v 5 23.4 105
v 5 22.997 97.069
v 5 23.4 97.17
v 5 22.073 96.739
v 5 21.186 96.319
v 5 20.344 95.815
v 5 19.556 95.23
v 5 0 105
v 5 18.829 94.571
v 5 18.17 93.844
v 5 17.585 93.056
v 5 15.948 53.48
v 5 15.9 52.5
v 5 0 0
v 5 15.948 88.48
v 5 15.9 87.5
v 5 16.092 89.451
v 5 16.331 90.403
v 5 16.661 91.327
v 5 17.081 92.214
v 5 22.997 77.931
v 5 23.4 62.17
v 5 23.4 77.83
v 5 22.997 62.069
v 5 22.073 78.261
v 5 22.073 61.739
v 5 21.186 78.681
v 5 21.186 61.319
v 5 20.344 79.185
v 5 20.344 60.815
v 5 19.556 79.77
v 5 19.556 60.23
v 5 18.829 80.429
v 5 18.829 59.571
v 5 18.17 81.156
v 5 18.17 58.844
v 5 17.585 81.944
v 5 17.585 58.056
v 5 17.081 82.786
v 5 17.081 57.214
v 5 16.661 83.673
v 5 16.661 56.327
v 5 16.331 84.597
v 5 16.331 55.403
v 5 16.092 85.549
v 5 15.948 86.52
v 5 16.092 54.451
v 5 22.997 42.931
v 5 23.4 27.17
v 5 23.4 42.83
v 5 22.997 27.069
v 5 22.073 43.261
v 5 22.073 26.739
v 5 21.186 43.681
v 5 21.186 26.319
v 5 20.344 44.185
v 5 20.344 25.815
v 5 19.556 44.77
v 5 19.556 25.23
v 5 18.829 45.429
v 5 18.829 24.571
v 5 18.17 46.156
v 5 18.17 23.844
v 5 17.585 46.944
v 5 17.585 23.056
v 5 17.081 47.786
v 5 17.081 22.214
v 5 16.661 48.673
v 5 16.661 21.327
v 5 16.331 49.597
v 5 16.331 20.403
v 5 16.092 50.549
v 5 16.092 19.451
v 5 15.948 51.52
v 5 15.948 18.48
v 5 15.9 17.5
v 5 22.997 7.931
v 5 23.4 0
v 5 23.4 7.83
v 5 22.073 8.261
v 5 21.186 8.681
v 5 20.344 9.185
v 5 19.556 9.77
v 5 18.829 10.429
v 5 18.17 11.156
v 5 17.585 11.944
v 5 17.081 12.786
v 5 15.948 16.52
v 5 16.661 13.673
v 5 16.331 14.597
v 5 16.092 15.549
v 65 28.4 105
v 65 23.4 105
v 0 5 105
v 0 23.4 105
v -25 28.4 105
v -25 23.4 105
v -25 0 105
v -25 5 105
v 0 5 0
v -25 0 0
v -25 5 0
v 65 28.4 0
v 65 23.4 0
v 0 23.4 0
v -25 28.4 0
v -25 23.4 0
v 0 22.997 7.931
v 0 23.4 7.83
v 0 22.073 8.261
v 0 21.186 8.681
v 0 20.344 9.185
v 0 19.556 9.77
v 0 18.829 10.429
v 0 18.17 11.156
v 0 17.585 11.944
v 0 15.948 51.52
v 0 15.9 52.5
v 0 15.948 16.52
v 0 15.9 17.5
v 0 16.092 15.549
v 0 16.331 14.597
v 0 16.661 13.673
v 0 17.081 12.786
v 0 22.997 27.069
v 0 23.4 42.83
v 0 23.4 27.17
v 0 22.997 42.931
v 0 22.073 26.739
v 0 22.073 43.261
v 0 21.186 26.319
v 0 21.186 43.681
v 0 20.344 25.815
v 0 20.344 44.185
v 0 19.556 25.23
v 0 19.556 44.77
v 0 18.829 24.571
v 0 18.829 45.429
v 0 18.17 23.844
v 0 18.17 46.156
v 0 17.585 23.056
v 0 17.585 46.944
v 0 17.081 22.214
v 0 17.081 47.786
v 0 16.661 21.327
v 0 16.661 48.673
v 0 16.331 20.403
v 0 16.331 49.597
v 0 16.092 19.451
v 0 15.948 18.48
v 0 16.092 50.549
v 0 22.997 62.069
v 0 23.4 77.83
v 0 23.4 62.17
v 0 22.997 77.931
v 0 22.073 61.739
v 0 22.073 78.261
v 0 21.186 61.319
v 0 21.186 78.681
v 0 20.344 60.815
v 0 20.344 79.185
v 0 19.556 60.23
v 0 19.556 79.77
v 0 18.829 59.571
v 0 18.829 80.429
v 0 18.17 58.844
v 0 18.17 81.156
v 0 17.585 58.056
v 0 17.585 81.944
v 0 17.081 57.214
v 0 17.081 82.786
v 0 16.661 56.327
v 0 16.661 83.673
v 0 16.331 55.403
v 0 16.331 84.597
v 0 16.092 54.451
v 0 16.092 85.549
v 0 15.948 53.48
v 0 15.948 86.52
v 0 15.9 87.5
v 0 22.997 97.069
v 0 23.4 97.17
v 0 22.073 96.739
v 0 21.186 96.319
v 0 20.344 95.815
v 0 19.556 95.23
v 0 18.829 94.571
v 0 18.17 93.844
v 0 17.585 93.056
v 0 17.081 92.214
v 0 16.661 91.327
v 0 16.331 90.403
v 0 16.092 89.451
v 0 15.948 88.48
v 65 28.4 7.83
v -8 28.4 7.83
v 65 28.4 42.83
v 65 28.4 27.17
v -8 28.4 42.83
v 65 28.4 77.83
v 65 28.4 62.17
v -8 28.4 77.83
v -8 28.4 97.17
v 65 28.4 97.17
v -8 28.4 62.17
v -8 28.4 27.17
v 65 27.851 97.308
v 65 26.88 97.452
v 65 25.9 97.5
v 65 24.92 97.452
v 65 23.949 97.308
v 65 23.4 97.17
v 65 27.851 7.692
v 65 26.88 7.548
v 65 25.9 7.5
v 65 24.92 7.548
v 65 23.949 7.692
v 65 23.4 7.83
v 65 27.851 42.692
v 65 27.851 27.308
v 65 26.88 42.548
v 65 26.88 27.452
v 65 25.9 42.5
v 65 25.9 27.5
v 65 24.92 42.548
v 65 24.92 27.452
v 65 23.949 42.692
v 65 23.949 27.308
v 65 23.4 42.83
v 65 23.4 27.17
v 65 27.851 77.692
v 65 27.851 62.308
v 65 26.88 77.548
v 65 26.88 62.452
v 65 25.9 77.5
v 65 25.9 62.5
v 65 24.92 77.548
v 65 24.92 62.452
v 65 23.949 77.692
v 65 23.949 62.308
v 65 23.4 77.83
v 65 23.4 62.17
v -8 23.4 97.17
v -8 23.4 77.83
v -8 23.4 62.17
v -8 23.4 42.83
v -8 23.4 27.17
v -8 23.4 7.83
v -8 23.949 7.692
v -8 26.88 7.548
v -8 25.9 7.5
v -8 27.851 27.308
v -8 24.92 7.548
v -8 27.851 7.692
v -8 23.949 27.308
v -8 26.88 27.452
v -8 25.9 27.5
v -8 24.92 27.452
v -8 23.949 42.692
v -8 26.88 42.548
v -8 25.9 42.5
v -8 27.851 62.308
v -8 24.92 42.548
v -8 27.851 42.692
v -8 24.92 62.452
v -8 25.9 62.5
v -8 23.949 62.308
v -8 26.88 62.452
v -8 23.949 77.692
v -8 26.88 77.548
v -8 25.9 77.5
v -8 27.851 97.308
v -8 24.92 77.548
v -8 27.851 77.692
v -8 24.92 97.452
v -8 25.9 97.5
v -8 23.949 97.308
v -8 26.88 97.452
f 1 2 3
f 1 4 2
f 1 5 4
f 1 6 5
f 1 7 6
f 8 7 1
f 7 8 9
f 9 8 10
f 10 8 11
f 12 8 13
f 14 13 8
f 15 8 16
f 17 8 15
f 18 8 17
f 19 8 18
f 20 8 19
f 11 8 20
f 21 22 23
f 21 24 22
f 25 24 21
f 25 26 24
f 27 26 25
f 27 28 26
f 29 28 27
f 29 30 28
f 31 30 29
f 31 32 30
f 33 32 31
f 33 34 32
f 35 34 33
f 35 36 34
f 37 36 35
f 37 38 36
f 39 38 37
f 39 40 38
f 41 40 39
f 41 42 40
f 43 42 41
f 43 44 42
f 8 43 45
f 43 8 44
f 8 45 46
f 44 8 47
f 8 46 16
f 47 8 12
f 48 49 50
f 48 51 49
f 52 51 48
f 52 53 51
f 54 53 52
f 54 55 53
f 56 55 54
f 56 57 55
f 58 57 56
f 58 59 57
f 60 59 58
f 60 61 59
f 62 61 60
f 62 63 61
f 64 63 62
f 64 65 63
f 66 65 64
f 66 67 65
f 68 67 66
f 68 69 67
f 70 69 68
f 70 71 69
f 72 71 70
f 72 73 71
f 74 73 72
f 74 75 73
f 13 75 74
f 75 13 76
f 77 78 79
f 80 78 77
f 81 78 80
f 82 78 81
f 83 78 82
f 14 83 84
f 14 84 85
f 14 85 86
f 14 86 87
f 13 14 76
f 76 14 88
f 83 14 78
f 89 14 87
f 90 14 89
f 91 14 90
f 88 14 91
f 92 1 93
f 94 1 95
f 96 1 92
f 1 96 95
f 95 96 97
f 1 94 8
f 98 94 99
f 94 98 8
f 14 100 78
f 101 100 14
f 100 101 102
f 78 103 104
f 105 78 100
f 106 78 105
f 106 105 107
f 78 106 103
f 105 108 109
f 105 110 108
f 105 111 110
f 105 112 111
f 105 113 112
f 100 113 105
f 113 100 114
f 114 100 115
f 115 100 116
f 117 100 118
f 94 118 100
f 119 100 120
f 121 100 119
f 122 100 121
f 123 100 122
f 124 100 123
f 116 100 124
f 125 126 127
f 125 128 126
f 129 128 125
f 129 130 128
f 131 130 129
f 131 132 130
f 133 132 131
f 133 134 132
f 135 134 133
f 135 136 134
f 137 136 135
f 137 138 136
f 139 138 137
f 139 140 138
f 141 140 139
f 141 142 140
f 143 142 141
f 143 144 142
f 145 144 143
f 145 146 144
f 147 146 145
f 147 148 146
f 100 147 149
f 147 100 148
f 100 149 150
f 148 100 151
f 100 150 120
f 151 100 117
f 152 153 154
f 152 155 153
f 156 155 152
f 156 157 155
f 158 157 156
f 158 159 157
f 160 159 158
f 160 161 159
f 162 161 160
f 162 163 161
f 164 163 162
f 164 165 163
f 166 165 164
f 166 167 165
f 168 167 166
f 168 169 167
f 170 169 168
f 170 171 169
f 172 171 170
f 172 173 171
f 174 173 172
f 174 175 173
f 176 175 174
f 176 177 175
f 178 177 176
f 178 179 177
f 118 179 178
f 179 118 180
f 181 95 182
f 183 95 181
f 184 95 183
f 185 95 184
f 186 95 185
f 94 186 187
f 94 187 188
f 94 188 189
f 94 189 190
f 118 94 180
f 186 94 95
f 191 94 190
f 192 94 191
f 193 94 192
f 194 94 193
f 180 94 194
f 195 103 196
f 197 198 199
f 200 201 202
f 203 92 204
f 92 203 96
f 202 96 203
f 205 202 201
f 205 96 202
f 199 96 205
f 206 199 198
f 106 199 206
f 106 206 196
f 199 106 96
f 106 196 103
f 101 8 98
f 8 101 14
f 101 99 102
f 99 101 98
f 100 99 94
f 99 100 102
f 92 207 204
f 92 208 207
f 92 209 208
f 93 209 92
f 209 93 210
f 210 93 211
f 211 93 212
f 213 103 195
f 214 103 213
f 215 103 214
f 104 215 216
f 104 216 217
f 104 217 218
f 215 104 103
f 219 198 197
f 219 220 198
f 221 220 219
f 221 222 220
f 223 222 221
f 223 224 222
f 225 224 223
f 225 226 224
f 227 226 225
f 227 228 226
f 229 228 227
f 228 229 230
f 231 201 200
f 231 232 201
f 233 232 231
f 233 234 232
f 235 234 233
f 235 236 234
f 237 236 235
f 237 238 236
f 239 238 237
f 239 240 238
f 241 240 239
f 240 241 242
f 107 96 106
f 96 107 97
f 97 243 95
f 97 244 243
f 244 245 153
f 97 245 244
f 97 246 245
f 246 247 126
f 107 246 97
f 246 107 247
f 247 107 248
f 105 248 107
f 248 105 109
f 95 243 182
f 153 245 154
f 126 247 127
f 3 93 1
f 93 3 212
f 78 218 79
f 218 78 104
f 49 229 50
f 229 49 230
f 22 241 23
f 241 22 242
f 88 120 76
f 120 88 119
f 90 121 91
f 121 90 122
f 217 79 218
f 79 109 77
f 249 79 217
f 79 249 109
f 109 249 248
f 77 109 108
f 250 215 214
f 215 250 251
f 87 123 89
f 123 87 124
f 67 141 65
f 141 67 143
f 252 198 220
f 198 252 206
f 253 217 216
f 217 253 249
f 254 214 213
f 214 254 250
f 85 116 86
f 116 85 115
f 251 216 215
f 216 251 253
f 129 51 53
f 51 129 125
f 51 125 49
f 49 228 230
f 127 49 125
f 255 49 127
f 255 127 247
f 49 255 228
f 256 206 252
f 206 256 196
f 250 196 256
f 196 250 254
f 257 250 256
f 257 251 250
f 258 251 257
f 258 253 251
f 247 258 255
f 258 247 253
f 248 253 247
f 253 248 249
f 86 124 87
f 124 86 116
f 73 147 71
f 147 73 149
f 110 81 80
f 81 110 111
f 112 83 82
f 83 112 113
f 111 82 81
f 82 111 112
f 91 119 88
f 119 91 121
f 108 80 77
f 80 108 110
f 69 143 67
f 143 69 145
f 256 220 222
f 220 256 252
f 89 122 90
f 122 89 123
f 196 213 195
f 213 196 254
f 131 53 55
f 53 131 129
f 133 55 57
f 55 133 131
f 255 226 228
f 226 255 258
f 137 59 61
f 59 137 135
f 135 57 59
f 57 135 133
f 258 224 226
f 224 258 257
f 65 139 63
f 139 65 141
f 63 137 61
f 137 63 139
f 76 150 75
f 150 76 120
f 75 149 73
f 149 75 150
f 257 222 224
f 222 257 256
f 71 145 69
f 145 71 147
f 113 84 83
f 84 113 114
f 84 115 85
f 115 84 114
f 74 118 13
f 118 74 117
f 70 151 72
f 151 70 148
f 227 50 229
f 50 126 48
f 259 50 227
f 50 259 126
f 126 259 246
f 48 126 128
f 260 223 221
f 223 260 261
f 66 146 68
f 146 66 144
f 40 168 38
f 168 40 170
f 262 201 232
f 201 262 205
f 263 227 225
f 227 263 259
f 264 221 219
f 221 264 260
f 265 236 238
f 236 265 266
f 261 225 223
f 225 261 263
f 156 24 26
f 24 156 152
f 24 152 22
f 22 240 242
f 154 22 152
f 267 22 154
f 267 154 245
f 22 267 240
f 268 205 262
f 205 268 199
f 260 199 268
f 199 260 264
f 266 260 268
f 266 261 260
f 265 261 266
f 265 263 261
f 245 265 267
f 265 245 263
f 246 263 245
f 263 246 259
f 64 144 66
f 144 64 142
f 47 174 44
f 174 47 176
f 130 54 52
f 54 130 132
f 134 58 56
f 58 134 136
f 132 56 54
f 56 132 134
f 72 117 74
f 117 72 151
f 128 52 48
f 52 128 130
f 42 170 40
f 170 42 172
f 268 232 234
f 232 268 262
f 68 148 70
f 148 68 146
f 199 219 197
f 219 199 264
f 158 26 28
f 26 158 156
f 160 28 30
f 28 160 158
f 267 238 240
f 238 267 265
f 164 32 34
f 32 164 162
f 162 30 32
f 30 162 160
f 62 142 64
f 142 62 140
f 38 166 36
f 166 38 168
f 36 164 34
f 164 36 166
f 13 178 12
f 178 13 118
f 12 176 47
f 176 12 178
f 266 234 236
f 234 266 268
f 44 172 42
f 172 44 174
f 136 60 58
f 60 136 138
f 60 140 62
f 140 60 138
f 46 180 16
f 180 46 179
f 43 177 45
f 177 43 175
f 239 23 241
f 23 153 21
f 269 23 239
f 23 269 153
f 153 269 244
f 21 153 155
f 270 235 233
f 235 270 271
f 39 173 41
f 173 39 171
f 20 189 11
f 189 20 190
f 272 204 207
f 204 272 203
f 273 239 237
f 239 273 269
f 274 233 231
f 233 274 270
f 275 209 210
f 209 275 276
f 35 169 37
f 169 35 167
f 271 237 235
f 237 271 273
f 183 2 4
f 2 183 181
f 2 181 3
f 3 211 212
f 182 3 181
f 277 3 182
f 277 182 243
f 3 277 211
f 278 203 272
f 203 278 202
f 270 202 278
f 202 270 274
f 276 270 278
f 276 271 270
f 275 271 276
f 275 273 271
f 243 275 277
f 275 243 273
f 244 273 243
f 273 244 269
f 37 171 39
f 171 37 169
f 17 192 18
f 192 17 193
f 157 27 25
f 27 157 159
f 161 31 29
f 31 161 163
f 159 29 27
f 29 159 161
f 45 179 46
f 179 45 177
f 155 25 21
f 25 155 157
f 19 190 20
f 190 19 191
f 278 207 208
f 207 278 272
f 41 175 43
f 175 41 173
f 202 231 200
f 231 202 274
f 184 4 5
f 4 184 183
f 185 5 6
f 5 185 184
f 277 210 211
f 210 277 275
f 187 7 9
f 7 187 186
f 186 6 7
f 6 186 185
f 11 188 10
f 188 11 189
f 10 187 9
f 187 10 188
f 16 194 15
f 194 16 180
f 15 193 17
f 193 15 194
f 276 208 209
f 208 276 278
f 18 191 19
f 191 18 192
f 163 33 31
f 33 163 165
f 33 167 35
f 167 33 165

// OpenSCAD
// Pipette Holder Clamp
// Designed for an 18mm thick shelf.
// Printed lying on its side (Z is the extrusion direction).

// --- Dimensions ---
shelf_thickness = 18.0;
spine_x_end     = 5.0;
spine_y_end     = 28.4;

bottom_jaw_x_start = -25.0;
bottom_jaw_x_end   = 5.0;
bottom_jaw_y_end    = 5.0;

arm_x_start      = -25.0;
arm_x_end        = 65.0;
arm_y_start      = 23.4;
arm_y_end        = 28.4;

extrusion_length = 105.0;

// Hole dimensions
hole_diameter    = 20.0;
hole_z_positions  = [17.5, 52.5, 87.5];
hole_x_pos       = 42.0;
// The hole is centered in the arm's Y-thickness. 
// Arm Y is 23.4 to 28.4 (thickness 5.0). Center is 25.9.
hole_y_center     = (arm_y_start + arm_y_end) / 2; 

$fn = 64;

module main_body() {
    union() {
        // Spine: x=0 to 5, y=0 to 28.4
        cube([spine_x_end, spine_y_end, extrusion_length]);
        
        // Bottom Jaw: x=-25 to 5, y=0 to 5
        translate([bottom_jaw_x_start, 0, 0])
            cube([bottom_jaw_x_end - bottom_jaw_x_start, bottom_jaw_y_end, extrusion_length]);
        
        // Top Jaw and Arm: x=-25 to 65, y=23.4 to 28.4
        translate([arm_x_start, arm_y_start, 0])
            cube([arm_x_end - arm_x_start, arm_y_end - arm_y_start, extrusion_length]);
    }
}

difference() {
    main_body();
    
    // Pipette Holes
    // Holes are through the arm along Y (vertically in use).
    // In print orientation (Z extrusion), the arm is in the XY plane.
    // "Through the arm along Y" means the cylinder axis is the Y axis.
    for (z_pos = hole_z_positions) {
        // We use a larger cylinder and translate it to ensure it cuts through the arm completely
        // The arm is at Y = [23.4, 28.4]. 
        // To ensure it cuts through, we center the cylinder at hole_y_center 
        // and make it long enough to span the Y range.
        translate([hole_x_pos, hole_y_center, z_pos])
            rotate([0, 90, 0])
                cylinder(h = 100, d = hole_diameter, center = true); 
    }
}
